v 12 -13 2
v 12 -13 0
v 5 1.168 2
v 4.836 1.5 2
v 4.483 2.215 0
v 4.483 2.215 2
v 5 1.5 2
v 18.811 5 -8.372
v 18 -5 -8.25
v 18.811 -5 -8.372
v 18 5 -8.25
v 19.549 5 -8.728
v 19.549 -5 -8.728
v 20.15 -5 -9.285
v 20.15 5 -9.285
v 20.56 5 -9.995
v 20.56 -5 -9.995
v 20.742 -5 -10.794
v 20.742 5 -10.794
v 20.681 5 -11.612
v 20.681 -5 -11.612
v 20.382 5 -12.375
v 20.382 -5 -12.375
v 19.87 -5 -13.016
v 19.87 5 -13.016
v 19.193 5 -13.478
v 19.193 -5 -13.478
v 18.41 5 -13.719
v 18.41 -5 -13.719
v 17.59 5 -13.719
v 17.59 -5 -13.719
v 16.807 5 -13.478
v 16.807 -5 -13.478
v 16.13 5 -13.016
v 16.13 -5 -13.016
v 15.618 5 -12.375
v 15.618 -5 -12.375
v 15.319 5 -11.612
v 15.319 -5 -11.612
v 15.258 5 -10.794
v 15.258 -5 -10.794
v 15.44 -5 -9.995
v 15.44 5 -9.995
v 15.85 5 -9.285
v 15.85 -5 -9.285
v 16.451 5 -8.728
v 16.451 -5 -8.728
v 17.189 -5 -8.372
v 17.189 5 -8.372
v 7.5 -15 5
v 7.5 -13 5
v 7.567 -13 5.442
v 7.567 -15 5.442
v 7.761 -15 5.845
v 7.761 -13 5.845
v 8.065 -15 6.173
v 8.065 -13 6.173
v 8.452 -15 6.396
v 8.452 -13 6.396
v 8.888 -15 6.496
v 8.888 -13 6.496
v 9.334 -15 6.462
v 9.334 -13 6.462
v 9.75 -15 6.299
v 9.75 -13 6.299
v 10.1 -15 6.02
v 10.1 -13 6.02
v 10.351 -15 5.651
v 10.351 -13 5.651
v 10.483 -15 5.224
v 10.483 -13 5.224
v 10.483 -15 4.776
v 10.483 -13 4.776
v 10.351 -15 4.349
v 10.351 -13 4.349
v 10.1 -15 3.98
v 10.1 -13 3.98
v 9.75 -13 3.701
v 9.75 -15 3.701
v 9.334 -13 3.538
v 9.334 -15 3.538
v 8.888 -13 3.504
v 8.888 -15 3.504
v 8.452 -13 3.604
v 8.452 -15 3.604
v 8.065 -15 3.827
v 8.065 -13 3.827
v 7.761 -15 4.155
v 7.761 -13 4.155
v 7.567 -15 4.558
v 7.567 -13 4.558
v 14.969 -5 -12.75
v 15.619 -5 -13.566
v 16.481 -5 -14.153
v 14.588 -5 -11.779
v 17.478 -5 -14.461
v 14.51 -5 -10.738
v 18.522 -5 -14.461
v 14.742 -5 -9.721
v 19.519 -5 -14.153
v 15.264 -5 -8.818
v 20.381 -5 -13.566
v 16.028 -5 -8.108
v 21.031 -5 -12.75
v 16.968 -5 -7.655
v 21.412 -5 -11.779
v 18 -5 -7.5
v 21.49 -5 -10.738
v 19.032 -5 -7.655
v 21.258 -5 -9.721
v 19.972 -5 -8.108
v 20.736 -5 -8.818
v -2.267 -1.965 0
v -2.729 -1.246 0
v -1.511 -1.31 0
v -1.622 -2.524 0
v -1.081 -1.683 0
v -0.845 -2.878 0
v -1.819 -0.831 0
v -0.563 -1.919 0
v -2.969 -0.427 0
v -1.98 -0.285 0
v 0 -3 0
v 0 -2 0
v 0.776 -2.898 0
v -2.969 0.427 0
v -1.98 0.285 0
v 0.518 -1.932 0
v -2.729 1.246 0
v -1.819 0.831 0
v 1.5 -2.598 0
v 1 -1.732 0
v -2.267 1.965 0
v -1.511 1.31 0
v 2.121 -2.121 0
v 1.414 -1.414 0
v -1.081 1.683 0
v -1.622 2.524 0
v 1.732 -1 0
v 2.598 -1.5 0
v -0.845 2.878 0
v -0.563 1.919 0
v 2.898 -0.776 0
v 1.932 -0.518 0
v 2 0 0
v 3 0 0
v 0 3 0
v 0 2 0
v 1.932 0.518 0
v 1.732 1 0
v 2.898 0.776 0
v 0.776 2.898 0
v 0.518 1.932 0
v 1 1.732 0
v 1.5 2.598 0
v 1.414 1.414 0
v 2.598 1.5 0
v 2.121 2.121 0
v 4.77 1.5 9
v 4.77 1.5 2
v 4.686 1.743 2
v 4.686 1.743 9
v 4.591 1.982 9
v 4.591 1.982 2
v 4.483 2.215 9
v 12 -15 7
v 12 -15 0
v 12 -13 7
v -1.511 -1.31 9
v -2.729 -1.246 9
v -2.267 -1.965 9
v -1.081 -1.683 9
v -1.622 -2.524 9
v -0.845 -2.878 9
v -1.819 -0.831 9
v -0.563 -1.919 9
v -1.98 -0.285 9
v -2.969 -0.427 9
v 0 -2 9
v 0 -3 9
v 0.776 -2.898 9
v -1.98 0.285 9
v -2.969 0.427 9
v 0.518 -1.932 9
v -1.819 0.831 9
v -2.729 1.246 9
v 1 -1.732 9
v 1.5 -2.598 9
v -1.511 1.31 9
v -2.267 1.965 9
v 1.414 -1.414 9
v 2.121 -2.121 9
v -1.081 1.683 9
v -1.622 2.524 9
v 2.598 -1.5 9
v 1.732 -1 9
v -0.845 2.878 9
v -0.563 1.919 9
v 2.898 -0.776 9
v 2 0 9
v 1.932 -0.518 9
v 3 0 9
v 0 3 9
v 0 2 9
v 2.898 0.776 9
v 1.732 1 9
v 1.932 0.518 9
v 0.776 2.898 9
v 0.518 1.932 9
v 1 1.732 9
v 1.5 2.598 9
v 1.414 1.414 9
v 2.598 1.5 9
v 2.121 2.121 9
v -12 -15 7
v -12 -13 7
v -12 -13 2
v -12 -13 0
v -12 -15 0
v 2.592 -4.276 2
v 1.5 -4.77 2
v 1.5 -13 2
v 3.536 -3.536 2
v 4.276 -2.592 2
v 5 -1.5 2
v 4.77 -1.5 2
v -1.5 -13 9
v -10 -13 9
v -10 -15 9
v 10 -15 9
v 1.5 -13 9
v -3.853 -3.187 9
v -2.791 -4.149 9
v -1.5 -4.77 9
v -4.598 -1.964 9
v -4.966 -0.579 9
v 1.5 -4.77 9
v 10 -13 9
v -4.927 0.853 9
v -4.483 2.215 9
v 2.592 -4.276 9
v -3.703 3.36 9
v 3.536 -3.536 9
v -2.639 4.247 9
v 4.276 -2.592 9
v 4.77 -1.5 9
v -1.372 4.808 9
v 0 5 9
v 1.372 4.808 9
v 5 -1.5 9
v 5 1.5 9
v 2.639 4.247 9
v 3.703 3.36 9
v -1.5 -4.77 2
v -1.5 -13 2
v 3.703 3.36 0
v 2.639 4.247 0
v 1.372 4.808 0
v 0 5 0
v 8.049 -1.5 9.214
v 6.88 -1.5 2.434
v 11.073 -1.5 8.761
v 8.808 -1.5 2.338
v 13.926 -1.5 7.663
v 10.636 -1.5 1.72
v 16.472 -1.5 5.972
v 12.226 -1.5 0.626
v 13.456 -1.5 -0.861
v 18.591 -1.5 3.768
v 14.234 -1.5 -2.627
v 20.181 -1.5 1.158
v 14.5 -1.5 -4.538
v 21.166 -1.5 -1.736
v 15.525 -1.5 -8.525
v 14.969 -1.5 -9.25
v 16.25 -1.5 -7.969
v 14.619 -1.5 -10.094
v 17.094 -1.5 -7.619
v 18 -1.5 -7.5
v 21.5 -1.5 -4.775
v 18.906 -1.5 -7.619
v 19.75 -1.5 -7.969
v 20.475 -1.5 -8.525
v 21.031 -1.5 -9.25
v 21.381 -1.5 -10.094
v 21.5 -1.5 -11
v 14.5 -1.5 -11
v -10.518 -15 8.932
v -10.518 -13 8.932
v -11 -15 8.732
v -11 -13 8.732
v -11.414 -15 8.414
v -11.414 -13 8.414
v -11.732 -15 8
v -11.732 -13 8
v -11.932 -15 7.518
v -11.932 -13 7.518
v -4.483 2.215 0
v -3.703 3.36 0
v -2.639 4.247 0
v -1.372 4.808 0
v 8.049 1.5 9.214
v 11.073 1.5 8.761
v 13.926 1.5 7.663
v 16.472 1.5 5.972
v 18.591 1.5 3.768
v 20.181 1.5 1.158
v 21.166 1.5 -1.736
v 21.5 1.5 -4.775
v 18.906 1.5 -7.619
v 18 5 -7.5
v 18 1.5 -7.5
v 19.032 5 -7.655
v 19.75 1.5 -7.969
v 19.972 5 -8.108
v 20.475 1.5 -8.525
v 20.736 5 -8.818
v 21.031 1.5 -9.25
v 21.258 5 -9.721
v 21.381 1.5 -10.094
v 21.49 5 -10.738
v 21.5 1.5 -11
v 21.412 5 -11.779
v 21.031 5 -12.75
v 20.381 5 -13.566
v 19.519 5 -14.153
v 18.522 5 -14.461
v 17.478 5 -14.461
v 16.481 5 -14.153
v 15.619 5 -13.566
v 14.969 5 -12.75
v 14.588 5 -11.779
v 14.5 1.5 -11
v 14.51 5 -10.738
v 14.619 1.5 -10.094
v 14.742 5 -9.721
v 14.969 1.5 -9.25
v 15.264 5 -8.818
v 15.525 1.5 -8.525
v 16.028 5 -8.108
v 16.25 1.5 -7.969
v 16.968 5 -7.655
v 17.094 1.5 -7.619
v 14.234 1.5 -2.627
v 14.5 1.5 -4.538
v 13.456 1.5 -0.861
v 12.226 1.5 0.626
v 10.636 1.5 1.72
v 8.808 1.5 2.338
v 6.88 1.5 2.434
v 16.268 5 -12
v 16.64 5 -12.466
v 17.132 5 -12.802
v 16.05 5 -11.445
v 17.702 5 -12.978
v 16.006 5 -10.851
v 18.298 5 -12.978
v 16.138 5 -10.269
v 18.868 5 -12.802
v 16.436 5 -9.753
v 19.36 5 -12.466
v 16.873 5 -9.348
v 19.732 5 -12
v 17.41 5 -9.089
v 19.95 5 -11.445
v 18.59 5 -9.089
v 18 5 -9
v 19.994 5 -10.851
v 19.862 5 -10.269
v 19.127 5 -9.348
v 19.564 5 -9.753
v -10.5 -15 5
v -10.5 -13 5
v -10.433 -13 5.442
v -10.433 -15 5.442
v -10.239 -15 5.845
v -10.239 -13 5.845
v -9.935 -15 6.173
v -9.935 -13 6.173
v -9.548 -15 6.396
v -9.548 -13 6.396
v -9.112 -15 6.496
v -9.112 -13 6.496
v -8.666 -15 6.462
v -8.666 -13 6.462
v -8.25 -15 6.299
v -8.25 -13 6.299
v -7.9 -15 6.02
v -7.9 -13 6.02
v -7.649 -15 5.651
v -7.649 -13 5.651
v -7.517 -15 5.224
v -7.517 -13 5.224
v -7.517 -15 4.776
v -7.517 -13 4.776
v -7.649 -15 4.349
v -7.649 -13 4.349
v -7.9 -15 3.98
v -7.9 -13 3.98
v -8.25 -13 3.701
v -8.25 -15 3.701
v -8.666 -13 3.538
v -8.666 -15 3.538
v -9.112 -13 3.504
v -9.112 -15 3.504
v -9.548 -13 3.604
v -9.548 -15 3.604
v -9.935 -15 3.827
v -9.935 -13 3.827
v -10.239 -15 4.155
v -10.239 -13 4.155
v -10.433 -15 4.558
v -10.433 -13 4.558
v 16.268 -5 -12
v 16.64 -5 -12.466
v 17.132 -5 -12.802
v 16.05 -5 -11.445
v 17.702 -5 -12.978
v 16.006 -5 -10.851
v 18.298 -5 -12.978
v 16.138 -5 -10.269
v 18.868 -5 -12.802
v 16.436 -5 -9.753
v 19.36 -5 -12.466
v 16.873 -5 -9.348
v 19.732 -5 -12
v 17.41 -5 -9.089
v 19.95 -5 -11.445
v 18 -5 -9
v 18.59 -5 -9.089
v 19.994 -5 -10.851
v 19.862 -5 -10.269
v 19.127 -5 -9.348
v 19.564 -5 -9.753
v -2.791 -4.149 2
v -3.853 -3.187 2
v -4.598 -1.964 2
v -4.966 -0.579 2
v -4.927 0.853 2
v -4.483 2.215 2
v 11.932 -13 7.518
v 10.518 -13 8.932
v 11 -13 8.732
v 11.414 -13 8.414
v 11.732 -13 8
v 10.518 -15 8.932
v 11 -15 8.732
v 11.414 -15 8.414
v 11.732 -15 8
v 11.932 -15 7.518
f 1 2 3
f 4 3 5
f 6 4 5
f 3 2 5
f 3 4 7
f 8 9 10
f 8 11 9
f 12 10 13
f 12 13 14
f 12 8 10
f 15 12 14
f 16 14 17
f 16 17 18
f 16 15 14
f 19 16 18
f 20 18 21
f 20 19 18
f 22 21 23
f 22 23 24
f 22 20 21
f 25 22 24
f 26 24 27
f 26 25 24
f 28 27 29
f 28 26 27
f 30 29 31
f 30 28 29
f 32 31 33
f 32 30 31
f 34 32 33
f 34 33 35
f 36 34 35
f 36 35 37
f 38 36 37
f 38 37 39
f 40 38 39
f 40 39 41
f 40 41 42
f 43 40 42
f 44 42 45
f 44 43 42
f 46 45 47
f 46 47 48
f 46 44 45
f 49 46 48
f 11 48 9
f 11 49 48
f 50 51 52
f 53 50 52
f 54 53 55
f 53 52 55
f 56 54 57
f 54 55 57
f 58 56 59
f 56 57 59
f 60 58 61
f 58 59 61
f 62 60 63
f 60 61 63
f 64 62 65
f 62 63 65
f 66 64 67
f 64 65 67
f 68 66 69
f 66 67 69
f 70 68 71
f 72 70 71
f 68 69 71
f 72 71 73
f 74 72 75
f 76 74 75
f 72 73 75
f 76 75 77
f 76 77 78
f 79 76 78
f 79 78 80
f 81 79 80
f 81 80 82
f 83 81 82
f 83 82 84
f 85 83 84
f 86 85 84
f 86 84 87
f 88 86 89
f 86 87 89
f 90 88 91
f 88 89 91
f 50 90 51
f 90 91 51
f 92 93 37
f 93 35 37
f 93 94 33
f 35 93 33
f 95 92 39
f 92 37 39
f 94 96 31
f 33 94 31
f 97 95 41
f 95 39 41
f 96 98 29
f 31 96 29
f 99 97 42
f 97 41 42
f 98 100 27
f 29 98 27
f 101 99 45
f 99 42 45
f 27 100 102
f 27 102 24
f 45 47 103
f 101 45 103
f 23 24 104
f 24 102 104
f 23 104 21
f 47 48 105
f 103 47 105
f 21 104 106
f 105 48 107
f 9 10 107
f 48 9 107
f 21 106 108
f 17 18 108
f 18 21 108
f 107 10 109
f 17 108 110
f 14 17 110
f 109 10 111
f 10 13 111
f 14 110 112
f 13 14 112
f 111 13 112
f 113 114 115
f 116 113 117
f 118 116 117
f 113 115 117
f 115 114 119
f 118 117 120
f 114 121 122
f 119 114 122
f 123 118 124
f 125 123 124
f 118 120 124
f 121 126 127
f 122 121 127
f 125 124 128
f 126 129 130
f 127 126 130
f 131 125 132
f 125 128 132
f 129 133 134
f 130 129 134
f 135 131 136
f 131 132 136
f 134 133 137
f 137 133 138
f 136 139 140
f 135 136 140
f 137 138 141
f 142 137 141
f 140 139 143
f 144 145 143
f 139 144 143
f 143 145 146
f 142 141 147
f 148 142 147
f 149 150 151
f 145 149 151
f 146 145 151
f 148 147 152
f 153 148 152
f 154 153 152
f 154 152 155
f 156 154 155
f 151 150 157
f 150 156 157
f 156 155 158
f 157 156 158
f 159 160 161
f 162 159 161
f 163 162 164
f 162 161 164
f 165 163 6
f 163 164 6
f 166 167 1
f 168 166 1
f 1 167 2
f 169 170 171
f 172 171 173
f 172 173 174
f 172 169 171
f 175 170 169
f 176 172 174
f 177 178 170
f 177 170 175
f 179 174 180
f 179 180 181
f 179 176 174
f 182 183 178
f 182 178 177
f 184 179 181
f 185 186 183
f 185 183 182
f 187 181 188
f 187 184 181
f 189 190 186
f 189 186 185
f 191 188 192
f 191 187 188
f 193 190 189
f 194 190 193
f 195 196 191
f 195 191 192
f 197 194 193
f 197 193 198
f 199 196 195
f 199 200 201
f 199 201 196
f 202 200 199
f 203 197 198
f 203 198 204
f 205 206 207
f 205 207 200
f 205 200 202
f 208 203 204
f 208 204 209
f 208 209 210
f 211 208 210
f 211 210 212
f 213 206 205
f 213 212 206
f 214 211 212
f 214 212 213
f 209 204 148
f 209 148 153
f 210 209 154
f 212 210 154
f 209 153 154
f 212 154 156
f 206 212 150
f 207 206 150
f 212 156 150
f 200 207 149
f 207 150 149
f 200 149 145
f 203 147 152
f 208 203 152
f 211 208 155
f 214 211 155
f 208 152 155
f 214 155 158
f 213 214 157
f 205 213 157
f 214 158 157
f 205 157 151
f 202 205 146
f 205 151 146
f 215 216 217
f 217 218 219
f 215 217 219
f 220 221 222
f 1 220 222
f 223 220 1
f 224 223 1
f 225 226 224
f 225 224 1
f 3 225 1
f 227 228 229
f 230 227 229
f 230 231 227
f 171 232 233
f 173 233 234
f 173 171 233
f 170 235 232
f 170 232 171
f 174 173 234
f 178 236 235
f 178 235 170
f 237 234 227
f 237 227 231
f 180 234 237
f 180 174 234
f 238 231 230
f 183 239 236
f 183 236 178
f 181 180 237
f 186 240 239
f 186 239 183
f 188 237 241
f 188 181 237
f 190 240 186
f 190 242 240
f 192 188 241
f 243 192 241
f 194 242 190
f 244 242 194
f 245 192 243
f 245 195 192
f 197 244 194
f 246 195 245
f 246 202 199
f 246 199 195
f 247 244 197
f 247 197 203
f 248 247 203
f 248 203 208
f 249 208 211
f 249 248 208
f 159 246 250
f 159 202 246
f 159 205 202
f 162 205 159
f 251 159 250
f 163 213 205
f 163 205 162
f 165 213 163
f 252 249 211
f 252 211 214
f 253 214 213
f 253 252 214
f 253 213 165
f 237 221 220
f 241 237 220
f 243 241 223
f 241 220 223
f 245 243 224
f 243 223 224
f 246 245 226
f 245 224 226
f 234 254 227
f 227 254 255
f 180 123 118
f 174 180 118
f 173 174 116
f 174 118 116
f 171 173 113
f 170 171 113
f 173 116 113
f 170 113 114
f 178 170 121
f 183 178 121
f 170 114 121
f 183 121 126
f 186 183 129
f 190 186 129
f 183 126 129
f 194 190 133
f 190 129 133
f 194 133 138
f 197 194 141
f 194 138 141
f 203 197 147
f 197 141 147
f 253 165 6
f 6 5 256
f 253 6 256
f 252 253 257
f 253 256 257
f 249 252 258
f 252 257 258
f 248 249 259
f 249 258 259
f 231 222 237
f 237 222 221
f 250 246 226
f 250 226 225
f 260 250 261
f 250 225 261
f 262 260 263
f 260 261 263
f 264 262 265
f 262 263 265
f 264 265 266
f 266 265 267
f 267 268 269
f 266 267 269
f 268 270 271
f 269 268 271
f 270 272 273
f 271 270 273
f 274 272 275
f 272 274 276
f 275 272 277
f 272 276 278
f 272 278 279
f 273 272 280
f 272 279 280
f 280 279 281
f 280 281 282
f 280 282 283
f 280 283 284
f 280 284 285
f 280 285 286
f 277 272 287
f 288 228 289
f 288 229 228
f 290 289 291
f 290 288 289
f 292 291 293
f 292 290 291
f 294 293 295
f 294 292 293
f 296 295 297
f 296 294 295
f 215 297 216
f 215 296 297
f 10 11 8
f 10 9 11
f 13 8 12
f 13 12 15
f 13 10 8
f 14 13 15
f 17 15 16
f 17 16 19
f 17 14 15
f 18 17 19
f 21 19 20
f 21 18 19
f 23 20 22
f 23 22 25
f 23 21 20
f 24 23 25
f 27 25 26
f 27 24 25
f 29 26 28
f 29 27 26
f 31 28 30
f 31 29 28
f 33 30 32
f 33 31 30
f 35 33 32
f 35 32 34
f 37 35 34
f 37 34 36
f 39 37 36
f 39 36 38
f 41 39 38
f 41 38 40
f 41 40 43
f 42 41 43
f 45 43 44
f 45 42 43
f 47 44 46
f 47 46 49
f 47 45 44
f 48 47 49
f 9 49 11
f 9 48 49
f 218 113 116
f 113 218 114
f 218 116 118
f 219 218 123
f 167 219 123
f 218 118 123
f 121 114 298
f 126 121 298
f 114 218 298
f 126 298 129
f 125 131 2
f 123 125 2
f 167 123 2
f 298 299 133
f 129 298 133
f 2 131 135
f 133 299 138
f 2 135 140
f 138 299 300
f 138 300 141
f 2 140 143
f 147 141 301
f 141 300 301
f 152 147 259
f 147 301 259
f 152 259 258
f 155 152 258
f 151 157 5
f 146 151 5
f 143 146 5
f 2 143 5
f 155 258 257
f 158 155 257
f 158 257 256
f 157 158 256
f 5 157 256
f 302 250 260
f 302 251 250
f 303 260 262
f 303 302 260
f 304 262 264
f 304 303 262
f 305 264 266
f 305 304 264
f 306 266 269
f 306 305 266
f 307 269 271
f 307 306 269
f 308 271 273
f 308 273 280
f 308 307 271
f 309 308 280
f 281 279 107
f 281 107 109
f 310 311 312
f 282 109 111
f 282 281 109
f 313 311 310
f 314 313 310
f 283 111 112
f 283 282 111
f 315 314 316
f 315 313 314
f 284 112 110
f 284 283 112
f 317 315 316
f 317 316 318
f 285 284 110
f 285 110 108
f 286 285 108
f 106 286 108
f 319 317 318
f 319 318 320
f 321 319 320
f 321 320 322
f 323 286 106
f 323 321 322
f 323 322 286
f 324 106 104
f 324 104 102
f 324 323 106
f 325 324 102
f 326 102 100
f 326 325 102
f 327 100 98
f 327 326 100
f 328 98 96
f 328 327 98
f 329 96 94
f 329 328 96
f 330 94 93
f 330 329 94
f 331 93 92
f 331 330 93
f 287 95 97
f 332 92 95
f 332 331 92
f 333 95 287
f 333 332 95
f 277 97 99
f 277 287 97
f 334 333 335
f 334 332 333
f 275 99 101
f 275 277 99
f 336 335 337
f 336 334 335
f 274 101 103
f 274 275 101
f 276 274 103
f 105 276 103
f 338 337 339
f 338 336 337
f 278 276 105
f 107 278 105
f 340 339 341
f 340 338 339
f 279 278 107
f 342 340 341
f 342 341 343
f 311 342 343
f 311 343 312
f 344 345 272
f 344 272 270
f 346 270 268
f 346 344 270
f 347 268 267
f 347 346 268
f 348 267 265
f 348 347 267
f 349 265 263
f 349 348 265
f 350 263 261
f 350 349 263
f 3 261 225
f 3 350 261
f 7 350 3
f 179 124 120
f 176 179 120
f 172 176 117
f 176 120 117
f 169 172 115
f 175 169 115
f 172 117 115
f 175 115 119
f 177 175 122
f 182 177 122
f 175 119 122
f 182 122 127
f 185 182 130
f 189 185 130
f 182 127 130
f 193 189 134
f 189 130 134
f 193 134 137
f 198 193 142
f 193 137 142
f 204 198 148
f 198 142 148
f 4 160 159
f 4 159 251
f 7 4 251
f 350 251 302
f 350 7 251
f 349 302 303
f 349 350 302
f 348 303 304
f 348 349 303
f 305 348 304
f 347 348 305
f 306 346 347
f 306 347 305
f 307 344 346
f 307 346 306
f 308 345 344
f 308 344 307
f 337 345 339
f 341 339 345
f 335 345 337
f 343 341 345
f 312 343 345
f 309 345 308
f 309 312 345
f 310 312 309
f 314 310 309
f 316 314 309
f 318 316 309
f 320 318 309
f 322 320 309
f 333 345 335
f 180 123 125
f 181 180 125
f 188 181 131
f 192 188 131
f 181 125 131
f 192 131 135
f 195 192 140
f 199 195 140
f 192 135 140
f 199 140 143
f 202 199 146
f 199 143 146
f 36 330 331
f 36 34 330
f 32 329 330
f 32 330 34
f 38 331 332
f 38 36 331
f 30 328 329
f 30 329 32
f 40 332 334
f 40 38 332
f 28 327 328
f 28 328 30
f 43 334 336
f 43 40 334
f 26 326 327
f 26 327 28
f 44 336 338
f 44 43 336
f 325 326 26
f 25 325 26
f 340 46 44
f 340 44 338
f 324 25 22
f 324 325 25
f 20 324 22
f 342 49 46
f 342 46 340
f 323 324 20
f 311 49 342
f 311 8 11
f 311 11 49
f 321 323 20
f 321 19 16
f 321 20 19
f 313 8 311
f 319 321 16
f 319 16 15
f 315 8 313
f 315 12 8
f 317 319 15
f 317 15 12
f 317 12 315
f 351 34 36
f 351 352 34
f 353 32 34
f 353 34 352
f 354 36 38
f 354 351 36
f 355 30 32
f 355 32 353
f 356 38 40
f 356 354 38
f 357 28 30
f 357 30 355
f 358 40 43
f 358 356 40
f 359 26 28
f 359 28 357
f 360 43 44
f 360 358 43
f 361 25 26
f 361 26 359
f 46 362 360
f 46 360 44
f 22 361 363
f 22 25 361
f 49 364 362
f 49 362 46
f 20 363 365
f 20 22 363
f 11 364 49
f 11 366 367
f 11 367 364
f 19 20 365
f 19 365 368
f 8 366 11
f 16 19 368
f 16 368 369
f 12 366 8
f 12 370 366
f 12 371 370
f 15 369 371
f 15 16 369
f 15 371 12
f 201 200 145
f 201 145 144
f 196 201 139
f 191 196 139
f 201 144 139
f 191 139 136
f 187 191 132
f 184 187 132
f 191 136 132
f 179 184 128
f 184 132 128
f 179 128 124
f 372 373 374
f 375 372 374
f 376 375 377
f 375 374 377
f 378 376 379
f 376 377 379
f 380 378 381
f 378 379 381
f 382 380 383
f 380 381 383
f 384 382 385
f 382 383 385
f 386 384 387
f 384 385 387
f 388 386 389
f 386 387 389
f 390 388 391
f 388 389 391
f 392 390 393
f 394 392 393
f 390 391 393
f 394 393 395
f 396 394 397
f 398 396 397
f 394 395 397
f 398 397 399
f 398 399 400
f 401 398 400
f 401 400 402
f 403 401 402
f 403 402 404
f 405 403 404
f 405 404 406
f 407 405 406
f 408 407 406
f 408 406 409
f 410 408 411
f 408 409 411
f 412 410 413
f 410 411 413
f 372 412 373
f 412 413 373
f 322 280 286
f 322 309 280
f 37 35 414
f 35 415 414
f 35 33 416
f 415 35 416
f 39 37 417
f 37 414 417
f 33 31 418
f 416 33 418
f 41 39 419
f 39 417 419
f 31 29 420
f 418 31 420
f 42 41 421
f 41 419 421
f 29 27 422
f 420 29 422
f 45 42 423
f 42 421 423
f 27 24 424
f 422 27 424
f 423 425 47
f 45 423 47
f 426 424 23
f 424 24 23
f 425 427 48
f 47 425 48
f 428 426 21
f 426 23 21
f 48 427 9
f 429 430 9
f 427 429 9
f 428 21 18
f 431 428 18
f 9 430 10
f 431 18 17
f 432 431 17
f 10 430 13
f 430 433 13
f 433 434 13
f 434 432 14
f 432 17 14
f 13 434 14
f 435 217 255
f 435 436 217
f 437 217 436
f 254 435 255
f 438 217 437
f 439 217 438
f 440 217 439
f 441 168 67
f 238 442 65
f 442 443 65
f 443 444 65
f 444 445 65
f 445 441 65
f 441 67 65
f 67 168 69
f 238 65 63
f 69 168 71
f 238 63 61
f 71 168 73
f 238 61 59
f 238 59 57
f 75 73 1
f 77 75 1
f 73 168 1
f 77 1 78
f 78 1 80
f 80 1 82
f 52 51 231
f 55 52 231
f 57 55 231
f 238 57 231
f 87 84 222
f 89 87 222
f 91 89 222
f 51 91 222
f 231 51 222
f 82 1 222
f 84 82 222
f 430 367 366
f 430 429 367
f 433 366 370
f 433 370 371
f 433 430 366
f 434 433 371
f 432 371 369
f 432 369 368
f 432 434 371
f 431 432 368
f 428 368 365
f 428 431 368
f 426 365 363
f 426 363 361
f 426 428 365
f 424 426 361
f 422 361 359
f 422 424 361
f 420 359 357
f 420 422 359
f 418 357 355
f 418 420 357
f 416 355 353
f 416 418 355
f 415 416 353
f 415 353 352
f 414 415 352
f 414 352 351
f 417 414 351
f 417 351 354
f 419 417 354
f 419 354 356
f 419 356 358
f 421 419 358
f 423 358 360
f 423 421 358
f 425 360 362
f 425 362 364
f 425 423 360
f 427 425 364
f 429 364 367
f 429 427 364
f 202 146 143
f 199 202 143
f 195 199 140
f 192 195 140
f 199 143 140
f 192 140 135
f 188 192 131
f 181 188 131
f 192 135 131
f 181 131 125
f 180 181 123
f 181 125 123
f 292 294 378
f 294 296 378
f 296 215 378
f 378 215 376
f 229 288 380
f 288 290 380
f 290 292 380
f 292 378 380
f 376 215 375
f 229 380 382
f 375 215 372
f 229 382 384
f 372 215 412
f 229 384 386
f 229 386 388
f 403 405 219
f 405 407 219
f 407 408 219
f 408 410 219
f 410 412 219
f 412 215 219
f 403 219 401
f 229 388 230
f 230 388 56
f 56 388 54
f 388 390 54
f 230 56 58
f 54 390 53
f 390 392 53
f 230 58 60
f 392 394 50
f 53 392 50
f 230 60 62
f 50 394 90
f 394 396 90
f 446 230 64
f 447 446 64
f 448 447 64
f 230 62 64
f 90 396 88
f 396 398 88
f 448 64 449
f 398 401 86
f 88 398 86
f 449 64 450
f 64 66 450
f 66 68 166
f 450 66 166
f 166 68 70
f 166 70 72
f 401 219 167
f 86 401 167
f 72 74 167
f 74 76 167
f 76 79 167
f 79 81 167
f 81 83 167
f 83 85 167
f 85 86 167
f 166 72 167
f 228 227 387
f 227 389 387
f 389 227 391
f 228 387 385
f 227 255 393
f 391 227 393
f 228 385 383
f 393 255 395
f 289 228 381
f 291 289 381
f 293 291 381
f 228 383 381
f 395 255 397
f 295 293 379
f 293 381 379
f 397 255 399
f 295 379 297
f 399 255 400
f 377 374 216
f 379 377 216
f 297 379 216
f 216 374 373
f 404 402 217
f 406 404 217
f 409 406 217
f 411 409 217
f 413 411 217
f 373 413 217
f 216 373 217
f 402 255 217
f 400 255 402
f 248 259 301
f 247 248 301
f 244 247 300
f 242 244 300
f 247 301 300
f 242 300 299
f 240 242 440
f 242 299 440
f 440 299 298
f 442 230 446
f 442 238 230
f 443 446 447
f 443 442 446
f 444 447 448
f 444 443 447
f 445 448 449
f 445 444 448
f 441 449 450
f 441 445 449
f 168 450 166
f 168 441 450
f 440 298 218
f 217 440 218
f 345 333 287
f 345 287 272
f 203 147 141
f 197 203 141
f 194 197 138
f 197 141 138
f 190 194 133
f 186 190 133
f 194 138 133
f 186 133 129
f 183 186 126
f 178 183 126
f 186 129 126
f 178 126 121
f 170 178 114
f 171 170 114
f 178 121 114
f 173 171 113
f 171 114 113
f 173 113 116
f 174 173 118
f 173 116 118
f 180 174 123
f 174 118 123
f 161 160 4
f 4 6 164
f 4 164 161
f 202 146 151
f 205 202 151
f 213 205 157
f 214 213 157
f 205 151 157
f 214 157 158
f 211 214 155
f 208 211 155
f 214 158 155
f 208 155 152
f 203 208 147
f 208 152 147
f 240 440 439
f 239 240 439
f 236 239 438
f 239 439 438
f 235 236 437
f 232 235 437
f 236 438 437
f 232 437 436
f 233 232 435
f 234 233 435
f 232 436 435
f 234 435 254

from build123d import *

# Parameters (mm, degrees)
BOSS_EXTRUDE1_DEPTH   = 2
BOSS_EXTRUDE1_2_DEPTH = 2
BOSS_EXTRUDE2_DEPTH   = 9
BOSS_EXTRUDE3_DEPTH   = 9
SKETCH2_R             = 1.5
CUT_EXTRUDE1_DEPTH    = 2
SKETCH4_W             = 1.262081145
SKETCH4_H             = 7
BOSS_EXTRUDE4_DEPTH   = 1.5
SKETCH4_4_R           = 3.5
SKETCH4_4_R_2         = 2.75
BOSS_EXTRUDE5_DEPTH   = 5
SKETCH4_5_R           = 2.75
SKETCH4_5_R_2         = 2
BOSS_EXTRUDE6_DEPTH   = 5
FILLET1_R             = 2


with BuildPart() as part:
    # Sketch1 → Boss-Extrude1 (new body)
    with BuildSketch(Plane.XY):
        with BuildLine():
            Line((1.5, -13), (12, -13))
            Line((12, -13), (4.482704724, 2.214804361))
            ThreePointArc((4.482704724, 2.214804361), (4.868959007, 1.137206309), (5, 0))
            ThreePointArc((5, 0), (4.031128874, -2.958039892), (1.5, -4.769696007))
            Line((1.5, -4.769696007), (1.5, -13))
        make_face()
    extrude(amount=BOSS_EXTRUDE1_DEPTH)



with BuildPart() as body_2:
    # Sketch1 → Boss-Extrude1 2 (new body)
    with BuildSketch(Plane.XY):
        with BuildLine():
            Line((-4.482704724, 2.214804361), (-12, -13))
            Line((-12, -13), (-1.5, -13))
            Line((-1.5, -13), (-1.5, -4.769696007))
            ThreePointArc((-1.5, -4.769696007), (-4.598260573, -1.963669957), (-4.482704724, 2.214804361))
        make_face()
    extrude(amount=BOSS_EXTRUDE1_2_DEPTH)


with BuildPart() as part_1:
    add(part.part)

    add(body_2.part)  # Boss-Extrude2 merges body 2
    # Sketch1<3> → Boss-Extrude2 (add)
    with BuildSketch(Plane.XY):
        Polygon((12, -15), (12, -13), (1.5, -13), (0, -13), (0, -15), align=None)
        Polygon((-1.5, -13), (-12, -13), (-12, -15), (0, -15), (0, -13), align=None)
        with BuildLine():
            ThreePointArc((4.482704724, 2.214804361), (2.638747638, 4.247000224), (0, 5))
            Line((0, 5), (0, 3))
            ThreePointArc((0, 3), (2.121320344, 2.121320344), (3, 0))
            ThreePointArc((3, 0), (2.121320344, -2.121320344), (0, -3))
            Line((0, -3), (0, -5))
            ThreePointArc((0, -5), (0.758788496, -4.942088629), (1.5, -4.769696007))
            ThreePointArc((1.5, -4.769696007), (4.031128874, -2.958039892), (5, 0))
            ThreePointArc((5, 0), (4.868959007, 1.137206309), (4.482704724, 2.214804361))
        make_face()
        with BuildLine():
            Line((0, 3), (0, 5))
            ThreePointArc((0, 5), (-2.638747638, 4.247000224), (-4.482704724, 2.214804361))
            ThreePointArc((-4.482704724, 2.214804361), (-4.598260573, -1.963669957), (-1.5, -4.769696007))
            ThreePointArc((-1.5, -4.769696007), (-0.758788496, -4.942088629), (0, -5))
            Line((0, -5), (0, -3))
            ThreePointArc((0, -3), (-3, 0), (0, 3))
        make_face()
        with BuildLine():
            ThreePointArc((1.5, -4.769696007), (0.758788496, -4.942088629), (0, -5))
            Line((0, -5), (0, -13))
            Line((0, -13), (1.5, -13))
            Line((1.5, -13), (1.5, -4.769696007))
        make_face()
        with BuildLine():
            ThreePointArc((0, -5), (-0.758788496, -4.942088629), (-1.5, -4.769696007))
            Line((-1.5, -4.769696007), (-1.5, -13))
            Line((-1.5, -13), (0, -13))
            Line((0, -13), (0, -5))
        make_face()
    extrude(amount=BOSS_EXTRUDE2_DEPTH)

    # Sketch2 → Cut-Extrude1 (cut)
    with BuildSketch(Plane(origin=(0, -13, 0), x_dir=(1, 0, 0), z_dir=(0, 1, 0))):
        with Locations(Location((9, -5, 0), (0, 0, 180))):
            Circle(SKETCH2_R)
        with Locations(Location((-9, -5, 0), (0, 0, 180))):
            Circle(SKETCH2_R)
    extrude(amount=-CUT_EXTRUDE1_DEPTH, mode=Mode.SUBTRACT)

    # Sketch4 → Boss-Extrude4 (add, symmetric)
    with BuildSketch(Plane(origin=(0, 0, 0), x_dir=(1, 0, 0), z_dir=(0, 1, 0))):
        with BuildLine():
            ThreePointArc((21.5, 11), (18, 7.5), (14.5, 11))
            Line((14.5, 11), (14.5, 4.538348415))
            ThreePointArc((14.5, 4.538348415), (11.468626967, -1.227932882), (5, -2))
            Line((5, -2), (5, -9))
            ThreePointArc((5, -9), (16.472179222, -5.972115316), (21.5, 4.774977314))
            Line((21.5, 4.774977314), (21.5, 11))
        make_face()
        with Locations((4.368959428, -5.5)):
            Rectangle(SKETCH4_W, SKETCH4_H)
    extrude(amount=BOSS_EXTRUDE4_DEPTH, both=True)

    # Sketch4<4> → Boss-Extrude5 (add, symmetric)
    with BuildSketch(Plane(origin=(0, 0, 0), x_dir=(1, 0, 0), z_dir=(0, 1, 0))):
        with Locations(Location((18, 11, 0), (0, 0, 270))):
            Circle(SKETCH4_4_R)
        with Locations(Location((18, 11, 0), (0, 0, 270))):
            Circle(SKETCH4_4_R_2, mode=Mode.SUBTRACT)
    extrude(amount=BOSS_EXTRUDE5_DEPTH, both=True)

    # Fillet1
    fillet1_edges = [part_1.edges().sort_by_distance(p)[0] for p in [
        (-12, -14, 9),
        (12, -14, 9),
    ]]
    fillet(fillet1_edges, radius=FILLET1_R)


with BuildPart() as body_2_2:
    # Sketch1<4> → Boss-Extrude3 (new body)
    with BuildSketch(Plane.XY):
        with BuildLine():
            ThreePointArc((3, 0), (2.121320344, 2.121320344), (0, 3))
            Line((0, 3), (0, 2))
            ThreePointArc((0, 2), (1.414213562, 1.414213562), (2, 0))
            ThreePointArc((2, 0), (1.414213562, -1.414213562), (0, -2))
            Line((0, -2), (0, -3))
            ThreePointArc((0, -3), (2.121320344, -2.121320344), (3, 0))
        make_face()
        with BuildLine():
            Line((0, 2), (0, 3))
            ThreePointArc((0, 3), (-3, 0), (0, -3))
            Line((0, -3), (0, -2))
            ThreePointArc((0, -2), (-2, 0), (0, 2))
        make_face()
    extrude(amount=BOSS_EXTRUDE3_DEPTH)


with BuildPart() as body_3:
    # Sketch4<5> → Boss-Extrude6 (new, symmetric)
    with BuildSketch(Plane(origin=(0, 0, 0), x_dir=(1, 0, 0), z_dir=(0, 1, 0))):
        with Locations(Location((18, 11, 0), (0, 0, 270))):
            Circle(SKETCH4_5_R)
        with Locations(Location((18, 11, 0), (0, 0, 270))):
            Circle(SKETCH4_5_R_2, mode=Mode.SUBTRACT)
    extrude(amount=BOSS_EXTRUDE6_DEPTH, both=True)


solid = Compound([part_1.part, body_2_2.part, body_3.part])
